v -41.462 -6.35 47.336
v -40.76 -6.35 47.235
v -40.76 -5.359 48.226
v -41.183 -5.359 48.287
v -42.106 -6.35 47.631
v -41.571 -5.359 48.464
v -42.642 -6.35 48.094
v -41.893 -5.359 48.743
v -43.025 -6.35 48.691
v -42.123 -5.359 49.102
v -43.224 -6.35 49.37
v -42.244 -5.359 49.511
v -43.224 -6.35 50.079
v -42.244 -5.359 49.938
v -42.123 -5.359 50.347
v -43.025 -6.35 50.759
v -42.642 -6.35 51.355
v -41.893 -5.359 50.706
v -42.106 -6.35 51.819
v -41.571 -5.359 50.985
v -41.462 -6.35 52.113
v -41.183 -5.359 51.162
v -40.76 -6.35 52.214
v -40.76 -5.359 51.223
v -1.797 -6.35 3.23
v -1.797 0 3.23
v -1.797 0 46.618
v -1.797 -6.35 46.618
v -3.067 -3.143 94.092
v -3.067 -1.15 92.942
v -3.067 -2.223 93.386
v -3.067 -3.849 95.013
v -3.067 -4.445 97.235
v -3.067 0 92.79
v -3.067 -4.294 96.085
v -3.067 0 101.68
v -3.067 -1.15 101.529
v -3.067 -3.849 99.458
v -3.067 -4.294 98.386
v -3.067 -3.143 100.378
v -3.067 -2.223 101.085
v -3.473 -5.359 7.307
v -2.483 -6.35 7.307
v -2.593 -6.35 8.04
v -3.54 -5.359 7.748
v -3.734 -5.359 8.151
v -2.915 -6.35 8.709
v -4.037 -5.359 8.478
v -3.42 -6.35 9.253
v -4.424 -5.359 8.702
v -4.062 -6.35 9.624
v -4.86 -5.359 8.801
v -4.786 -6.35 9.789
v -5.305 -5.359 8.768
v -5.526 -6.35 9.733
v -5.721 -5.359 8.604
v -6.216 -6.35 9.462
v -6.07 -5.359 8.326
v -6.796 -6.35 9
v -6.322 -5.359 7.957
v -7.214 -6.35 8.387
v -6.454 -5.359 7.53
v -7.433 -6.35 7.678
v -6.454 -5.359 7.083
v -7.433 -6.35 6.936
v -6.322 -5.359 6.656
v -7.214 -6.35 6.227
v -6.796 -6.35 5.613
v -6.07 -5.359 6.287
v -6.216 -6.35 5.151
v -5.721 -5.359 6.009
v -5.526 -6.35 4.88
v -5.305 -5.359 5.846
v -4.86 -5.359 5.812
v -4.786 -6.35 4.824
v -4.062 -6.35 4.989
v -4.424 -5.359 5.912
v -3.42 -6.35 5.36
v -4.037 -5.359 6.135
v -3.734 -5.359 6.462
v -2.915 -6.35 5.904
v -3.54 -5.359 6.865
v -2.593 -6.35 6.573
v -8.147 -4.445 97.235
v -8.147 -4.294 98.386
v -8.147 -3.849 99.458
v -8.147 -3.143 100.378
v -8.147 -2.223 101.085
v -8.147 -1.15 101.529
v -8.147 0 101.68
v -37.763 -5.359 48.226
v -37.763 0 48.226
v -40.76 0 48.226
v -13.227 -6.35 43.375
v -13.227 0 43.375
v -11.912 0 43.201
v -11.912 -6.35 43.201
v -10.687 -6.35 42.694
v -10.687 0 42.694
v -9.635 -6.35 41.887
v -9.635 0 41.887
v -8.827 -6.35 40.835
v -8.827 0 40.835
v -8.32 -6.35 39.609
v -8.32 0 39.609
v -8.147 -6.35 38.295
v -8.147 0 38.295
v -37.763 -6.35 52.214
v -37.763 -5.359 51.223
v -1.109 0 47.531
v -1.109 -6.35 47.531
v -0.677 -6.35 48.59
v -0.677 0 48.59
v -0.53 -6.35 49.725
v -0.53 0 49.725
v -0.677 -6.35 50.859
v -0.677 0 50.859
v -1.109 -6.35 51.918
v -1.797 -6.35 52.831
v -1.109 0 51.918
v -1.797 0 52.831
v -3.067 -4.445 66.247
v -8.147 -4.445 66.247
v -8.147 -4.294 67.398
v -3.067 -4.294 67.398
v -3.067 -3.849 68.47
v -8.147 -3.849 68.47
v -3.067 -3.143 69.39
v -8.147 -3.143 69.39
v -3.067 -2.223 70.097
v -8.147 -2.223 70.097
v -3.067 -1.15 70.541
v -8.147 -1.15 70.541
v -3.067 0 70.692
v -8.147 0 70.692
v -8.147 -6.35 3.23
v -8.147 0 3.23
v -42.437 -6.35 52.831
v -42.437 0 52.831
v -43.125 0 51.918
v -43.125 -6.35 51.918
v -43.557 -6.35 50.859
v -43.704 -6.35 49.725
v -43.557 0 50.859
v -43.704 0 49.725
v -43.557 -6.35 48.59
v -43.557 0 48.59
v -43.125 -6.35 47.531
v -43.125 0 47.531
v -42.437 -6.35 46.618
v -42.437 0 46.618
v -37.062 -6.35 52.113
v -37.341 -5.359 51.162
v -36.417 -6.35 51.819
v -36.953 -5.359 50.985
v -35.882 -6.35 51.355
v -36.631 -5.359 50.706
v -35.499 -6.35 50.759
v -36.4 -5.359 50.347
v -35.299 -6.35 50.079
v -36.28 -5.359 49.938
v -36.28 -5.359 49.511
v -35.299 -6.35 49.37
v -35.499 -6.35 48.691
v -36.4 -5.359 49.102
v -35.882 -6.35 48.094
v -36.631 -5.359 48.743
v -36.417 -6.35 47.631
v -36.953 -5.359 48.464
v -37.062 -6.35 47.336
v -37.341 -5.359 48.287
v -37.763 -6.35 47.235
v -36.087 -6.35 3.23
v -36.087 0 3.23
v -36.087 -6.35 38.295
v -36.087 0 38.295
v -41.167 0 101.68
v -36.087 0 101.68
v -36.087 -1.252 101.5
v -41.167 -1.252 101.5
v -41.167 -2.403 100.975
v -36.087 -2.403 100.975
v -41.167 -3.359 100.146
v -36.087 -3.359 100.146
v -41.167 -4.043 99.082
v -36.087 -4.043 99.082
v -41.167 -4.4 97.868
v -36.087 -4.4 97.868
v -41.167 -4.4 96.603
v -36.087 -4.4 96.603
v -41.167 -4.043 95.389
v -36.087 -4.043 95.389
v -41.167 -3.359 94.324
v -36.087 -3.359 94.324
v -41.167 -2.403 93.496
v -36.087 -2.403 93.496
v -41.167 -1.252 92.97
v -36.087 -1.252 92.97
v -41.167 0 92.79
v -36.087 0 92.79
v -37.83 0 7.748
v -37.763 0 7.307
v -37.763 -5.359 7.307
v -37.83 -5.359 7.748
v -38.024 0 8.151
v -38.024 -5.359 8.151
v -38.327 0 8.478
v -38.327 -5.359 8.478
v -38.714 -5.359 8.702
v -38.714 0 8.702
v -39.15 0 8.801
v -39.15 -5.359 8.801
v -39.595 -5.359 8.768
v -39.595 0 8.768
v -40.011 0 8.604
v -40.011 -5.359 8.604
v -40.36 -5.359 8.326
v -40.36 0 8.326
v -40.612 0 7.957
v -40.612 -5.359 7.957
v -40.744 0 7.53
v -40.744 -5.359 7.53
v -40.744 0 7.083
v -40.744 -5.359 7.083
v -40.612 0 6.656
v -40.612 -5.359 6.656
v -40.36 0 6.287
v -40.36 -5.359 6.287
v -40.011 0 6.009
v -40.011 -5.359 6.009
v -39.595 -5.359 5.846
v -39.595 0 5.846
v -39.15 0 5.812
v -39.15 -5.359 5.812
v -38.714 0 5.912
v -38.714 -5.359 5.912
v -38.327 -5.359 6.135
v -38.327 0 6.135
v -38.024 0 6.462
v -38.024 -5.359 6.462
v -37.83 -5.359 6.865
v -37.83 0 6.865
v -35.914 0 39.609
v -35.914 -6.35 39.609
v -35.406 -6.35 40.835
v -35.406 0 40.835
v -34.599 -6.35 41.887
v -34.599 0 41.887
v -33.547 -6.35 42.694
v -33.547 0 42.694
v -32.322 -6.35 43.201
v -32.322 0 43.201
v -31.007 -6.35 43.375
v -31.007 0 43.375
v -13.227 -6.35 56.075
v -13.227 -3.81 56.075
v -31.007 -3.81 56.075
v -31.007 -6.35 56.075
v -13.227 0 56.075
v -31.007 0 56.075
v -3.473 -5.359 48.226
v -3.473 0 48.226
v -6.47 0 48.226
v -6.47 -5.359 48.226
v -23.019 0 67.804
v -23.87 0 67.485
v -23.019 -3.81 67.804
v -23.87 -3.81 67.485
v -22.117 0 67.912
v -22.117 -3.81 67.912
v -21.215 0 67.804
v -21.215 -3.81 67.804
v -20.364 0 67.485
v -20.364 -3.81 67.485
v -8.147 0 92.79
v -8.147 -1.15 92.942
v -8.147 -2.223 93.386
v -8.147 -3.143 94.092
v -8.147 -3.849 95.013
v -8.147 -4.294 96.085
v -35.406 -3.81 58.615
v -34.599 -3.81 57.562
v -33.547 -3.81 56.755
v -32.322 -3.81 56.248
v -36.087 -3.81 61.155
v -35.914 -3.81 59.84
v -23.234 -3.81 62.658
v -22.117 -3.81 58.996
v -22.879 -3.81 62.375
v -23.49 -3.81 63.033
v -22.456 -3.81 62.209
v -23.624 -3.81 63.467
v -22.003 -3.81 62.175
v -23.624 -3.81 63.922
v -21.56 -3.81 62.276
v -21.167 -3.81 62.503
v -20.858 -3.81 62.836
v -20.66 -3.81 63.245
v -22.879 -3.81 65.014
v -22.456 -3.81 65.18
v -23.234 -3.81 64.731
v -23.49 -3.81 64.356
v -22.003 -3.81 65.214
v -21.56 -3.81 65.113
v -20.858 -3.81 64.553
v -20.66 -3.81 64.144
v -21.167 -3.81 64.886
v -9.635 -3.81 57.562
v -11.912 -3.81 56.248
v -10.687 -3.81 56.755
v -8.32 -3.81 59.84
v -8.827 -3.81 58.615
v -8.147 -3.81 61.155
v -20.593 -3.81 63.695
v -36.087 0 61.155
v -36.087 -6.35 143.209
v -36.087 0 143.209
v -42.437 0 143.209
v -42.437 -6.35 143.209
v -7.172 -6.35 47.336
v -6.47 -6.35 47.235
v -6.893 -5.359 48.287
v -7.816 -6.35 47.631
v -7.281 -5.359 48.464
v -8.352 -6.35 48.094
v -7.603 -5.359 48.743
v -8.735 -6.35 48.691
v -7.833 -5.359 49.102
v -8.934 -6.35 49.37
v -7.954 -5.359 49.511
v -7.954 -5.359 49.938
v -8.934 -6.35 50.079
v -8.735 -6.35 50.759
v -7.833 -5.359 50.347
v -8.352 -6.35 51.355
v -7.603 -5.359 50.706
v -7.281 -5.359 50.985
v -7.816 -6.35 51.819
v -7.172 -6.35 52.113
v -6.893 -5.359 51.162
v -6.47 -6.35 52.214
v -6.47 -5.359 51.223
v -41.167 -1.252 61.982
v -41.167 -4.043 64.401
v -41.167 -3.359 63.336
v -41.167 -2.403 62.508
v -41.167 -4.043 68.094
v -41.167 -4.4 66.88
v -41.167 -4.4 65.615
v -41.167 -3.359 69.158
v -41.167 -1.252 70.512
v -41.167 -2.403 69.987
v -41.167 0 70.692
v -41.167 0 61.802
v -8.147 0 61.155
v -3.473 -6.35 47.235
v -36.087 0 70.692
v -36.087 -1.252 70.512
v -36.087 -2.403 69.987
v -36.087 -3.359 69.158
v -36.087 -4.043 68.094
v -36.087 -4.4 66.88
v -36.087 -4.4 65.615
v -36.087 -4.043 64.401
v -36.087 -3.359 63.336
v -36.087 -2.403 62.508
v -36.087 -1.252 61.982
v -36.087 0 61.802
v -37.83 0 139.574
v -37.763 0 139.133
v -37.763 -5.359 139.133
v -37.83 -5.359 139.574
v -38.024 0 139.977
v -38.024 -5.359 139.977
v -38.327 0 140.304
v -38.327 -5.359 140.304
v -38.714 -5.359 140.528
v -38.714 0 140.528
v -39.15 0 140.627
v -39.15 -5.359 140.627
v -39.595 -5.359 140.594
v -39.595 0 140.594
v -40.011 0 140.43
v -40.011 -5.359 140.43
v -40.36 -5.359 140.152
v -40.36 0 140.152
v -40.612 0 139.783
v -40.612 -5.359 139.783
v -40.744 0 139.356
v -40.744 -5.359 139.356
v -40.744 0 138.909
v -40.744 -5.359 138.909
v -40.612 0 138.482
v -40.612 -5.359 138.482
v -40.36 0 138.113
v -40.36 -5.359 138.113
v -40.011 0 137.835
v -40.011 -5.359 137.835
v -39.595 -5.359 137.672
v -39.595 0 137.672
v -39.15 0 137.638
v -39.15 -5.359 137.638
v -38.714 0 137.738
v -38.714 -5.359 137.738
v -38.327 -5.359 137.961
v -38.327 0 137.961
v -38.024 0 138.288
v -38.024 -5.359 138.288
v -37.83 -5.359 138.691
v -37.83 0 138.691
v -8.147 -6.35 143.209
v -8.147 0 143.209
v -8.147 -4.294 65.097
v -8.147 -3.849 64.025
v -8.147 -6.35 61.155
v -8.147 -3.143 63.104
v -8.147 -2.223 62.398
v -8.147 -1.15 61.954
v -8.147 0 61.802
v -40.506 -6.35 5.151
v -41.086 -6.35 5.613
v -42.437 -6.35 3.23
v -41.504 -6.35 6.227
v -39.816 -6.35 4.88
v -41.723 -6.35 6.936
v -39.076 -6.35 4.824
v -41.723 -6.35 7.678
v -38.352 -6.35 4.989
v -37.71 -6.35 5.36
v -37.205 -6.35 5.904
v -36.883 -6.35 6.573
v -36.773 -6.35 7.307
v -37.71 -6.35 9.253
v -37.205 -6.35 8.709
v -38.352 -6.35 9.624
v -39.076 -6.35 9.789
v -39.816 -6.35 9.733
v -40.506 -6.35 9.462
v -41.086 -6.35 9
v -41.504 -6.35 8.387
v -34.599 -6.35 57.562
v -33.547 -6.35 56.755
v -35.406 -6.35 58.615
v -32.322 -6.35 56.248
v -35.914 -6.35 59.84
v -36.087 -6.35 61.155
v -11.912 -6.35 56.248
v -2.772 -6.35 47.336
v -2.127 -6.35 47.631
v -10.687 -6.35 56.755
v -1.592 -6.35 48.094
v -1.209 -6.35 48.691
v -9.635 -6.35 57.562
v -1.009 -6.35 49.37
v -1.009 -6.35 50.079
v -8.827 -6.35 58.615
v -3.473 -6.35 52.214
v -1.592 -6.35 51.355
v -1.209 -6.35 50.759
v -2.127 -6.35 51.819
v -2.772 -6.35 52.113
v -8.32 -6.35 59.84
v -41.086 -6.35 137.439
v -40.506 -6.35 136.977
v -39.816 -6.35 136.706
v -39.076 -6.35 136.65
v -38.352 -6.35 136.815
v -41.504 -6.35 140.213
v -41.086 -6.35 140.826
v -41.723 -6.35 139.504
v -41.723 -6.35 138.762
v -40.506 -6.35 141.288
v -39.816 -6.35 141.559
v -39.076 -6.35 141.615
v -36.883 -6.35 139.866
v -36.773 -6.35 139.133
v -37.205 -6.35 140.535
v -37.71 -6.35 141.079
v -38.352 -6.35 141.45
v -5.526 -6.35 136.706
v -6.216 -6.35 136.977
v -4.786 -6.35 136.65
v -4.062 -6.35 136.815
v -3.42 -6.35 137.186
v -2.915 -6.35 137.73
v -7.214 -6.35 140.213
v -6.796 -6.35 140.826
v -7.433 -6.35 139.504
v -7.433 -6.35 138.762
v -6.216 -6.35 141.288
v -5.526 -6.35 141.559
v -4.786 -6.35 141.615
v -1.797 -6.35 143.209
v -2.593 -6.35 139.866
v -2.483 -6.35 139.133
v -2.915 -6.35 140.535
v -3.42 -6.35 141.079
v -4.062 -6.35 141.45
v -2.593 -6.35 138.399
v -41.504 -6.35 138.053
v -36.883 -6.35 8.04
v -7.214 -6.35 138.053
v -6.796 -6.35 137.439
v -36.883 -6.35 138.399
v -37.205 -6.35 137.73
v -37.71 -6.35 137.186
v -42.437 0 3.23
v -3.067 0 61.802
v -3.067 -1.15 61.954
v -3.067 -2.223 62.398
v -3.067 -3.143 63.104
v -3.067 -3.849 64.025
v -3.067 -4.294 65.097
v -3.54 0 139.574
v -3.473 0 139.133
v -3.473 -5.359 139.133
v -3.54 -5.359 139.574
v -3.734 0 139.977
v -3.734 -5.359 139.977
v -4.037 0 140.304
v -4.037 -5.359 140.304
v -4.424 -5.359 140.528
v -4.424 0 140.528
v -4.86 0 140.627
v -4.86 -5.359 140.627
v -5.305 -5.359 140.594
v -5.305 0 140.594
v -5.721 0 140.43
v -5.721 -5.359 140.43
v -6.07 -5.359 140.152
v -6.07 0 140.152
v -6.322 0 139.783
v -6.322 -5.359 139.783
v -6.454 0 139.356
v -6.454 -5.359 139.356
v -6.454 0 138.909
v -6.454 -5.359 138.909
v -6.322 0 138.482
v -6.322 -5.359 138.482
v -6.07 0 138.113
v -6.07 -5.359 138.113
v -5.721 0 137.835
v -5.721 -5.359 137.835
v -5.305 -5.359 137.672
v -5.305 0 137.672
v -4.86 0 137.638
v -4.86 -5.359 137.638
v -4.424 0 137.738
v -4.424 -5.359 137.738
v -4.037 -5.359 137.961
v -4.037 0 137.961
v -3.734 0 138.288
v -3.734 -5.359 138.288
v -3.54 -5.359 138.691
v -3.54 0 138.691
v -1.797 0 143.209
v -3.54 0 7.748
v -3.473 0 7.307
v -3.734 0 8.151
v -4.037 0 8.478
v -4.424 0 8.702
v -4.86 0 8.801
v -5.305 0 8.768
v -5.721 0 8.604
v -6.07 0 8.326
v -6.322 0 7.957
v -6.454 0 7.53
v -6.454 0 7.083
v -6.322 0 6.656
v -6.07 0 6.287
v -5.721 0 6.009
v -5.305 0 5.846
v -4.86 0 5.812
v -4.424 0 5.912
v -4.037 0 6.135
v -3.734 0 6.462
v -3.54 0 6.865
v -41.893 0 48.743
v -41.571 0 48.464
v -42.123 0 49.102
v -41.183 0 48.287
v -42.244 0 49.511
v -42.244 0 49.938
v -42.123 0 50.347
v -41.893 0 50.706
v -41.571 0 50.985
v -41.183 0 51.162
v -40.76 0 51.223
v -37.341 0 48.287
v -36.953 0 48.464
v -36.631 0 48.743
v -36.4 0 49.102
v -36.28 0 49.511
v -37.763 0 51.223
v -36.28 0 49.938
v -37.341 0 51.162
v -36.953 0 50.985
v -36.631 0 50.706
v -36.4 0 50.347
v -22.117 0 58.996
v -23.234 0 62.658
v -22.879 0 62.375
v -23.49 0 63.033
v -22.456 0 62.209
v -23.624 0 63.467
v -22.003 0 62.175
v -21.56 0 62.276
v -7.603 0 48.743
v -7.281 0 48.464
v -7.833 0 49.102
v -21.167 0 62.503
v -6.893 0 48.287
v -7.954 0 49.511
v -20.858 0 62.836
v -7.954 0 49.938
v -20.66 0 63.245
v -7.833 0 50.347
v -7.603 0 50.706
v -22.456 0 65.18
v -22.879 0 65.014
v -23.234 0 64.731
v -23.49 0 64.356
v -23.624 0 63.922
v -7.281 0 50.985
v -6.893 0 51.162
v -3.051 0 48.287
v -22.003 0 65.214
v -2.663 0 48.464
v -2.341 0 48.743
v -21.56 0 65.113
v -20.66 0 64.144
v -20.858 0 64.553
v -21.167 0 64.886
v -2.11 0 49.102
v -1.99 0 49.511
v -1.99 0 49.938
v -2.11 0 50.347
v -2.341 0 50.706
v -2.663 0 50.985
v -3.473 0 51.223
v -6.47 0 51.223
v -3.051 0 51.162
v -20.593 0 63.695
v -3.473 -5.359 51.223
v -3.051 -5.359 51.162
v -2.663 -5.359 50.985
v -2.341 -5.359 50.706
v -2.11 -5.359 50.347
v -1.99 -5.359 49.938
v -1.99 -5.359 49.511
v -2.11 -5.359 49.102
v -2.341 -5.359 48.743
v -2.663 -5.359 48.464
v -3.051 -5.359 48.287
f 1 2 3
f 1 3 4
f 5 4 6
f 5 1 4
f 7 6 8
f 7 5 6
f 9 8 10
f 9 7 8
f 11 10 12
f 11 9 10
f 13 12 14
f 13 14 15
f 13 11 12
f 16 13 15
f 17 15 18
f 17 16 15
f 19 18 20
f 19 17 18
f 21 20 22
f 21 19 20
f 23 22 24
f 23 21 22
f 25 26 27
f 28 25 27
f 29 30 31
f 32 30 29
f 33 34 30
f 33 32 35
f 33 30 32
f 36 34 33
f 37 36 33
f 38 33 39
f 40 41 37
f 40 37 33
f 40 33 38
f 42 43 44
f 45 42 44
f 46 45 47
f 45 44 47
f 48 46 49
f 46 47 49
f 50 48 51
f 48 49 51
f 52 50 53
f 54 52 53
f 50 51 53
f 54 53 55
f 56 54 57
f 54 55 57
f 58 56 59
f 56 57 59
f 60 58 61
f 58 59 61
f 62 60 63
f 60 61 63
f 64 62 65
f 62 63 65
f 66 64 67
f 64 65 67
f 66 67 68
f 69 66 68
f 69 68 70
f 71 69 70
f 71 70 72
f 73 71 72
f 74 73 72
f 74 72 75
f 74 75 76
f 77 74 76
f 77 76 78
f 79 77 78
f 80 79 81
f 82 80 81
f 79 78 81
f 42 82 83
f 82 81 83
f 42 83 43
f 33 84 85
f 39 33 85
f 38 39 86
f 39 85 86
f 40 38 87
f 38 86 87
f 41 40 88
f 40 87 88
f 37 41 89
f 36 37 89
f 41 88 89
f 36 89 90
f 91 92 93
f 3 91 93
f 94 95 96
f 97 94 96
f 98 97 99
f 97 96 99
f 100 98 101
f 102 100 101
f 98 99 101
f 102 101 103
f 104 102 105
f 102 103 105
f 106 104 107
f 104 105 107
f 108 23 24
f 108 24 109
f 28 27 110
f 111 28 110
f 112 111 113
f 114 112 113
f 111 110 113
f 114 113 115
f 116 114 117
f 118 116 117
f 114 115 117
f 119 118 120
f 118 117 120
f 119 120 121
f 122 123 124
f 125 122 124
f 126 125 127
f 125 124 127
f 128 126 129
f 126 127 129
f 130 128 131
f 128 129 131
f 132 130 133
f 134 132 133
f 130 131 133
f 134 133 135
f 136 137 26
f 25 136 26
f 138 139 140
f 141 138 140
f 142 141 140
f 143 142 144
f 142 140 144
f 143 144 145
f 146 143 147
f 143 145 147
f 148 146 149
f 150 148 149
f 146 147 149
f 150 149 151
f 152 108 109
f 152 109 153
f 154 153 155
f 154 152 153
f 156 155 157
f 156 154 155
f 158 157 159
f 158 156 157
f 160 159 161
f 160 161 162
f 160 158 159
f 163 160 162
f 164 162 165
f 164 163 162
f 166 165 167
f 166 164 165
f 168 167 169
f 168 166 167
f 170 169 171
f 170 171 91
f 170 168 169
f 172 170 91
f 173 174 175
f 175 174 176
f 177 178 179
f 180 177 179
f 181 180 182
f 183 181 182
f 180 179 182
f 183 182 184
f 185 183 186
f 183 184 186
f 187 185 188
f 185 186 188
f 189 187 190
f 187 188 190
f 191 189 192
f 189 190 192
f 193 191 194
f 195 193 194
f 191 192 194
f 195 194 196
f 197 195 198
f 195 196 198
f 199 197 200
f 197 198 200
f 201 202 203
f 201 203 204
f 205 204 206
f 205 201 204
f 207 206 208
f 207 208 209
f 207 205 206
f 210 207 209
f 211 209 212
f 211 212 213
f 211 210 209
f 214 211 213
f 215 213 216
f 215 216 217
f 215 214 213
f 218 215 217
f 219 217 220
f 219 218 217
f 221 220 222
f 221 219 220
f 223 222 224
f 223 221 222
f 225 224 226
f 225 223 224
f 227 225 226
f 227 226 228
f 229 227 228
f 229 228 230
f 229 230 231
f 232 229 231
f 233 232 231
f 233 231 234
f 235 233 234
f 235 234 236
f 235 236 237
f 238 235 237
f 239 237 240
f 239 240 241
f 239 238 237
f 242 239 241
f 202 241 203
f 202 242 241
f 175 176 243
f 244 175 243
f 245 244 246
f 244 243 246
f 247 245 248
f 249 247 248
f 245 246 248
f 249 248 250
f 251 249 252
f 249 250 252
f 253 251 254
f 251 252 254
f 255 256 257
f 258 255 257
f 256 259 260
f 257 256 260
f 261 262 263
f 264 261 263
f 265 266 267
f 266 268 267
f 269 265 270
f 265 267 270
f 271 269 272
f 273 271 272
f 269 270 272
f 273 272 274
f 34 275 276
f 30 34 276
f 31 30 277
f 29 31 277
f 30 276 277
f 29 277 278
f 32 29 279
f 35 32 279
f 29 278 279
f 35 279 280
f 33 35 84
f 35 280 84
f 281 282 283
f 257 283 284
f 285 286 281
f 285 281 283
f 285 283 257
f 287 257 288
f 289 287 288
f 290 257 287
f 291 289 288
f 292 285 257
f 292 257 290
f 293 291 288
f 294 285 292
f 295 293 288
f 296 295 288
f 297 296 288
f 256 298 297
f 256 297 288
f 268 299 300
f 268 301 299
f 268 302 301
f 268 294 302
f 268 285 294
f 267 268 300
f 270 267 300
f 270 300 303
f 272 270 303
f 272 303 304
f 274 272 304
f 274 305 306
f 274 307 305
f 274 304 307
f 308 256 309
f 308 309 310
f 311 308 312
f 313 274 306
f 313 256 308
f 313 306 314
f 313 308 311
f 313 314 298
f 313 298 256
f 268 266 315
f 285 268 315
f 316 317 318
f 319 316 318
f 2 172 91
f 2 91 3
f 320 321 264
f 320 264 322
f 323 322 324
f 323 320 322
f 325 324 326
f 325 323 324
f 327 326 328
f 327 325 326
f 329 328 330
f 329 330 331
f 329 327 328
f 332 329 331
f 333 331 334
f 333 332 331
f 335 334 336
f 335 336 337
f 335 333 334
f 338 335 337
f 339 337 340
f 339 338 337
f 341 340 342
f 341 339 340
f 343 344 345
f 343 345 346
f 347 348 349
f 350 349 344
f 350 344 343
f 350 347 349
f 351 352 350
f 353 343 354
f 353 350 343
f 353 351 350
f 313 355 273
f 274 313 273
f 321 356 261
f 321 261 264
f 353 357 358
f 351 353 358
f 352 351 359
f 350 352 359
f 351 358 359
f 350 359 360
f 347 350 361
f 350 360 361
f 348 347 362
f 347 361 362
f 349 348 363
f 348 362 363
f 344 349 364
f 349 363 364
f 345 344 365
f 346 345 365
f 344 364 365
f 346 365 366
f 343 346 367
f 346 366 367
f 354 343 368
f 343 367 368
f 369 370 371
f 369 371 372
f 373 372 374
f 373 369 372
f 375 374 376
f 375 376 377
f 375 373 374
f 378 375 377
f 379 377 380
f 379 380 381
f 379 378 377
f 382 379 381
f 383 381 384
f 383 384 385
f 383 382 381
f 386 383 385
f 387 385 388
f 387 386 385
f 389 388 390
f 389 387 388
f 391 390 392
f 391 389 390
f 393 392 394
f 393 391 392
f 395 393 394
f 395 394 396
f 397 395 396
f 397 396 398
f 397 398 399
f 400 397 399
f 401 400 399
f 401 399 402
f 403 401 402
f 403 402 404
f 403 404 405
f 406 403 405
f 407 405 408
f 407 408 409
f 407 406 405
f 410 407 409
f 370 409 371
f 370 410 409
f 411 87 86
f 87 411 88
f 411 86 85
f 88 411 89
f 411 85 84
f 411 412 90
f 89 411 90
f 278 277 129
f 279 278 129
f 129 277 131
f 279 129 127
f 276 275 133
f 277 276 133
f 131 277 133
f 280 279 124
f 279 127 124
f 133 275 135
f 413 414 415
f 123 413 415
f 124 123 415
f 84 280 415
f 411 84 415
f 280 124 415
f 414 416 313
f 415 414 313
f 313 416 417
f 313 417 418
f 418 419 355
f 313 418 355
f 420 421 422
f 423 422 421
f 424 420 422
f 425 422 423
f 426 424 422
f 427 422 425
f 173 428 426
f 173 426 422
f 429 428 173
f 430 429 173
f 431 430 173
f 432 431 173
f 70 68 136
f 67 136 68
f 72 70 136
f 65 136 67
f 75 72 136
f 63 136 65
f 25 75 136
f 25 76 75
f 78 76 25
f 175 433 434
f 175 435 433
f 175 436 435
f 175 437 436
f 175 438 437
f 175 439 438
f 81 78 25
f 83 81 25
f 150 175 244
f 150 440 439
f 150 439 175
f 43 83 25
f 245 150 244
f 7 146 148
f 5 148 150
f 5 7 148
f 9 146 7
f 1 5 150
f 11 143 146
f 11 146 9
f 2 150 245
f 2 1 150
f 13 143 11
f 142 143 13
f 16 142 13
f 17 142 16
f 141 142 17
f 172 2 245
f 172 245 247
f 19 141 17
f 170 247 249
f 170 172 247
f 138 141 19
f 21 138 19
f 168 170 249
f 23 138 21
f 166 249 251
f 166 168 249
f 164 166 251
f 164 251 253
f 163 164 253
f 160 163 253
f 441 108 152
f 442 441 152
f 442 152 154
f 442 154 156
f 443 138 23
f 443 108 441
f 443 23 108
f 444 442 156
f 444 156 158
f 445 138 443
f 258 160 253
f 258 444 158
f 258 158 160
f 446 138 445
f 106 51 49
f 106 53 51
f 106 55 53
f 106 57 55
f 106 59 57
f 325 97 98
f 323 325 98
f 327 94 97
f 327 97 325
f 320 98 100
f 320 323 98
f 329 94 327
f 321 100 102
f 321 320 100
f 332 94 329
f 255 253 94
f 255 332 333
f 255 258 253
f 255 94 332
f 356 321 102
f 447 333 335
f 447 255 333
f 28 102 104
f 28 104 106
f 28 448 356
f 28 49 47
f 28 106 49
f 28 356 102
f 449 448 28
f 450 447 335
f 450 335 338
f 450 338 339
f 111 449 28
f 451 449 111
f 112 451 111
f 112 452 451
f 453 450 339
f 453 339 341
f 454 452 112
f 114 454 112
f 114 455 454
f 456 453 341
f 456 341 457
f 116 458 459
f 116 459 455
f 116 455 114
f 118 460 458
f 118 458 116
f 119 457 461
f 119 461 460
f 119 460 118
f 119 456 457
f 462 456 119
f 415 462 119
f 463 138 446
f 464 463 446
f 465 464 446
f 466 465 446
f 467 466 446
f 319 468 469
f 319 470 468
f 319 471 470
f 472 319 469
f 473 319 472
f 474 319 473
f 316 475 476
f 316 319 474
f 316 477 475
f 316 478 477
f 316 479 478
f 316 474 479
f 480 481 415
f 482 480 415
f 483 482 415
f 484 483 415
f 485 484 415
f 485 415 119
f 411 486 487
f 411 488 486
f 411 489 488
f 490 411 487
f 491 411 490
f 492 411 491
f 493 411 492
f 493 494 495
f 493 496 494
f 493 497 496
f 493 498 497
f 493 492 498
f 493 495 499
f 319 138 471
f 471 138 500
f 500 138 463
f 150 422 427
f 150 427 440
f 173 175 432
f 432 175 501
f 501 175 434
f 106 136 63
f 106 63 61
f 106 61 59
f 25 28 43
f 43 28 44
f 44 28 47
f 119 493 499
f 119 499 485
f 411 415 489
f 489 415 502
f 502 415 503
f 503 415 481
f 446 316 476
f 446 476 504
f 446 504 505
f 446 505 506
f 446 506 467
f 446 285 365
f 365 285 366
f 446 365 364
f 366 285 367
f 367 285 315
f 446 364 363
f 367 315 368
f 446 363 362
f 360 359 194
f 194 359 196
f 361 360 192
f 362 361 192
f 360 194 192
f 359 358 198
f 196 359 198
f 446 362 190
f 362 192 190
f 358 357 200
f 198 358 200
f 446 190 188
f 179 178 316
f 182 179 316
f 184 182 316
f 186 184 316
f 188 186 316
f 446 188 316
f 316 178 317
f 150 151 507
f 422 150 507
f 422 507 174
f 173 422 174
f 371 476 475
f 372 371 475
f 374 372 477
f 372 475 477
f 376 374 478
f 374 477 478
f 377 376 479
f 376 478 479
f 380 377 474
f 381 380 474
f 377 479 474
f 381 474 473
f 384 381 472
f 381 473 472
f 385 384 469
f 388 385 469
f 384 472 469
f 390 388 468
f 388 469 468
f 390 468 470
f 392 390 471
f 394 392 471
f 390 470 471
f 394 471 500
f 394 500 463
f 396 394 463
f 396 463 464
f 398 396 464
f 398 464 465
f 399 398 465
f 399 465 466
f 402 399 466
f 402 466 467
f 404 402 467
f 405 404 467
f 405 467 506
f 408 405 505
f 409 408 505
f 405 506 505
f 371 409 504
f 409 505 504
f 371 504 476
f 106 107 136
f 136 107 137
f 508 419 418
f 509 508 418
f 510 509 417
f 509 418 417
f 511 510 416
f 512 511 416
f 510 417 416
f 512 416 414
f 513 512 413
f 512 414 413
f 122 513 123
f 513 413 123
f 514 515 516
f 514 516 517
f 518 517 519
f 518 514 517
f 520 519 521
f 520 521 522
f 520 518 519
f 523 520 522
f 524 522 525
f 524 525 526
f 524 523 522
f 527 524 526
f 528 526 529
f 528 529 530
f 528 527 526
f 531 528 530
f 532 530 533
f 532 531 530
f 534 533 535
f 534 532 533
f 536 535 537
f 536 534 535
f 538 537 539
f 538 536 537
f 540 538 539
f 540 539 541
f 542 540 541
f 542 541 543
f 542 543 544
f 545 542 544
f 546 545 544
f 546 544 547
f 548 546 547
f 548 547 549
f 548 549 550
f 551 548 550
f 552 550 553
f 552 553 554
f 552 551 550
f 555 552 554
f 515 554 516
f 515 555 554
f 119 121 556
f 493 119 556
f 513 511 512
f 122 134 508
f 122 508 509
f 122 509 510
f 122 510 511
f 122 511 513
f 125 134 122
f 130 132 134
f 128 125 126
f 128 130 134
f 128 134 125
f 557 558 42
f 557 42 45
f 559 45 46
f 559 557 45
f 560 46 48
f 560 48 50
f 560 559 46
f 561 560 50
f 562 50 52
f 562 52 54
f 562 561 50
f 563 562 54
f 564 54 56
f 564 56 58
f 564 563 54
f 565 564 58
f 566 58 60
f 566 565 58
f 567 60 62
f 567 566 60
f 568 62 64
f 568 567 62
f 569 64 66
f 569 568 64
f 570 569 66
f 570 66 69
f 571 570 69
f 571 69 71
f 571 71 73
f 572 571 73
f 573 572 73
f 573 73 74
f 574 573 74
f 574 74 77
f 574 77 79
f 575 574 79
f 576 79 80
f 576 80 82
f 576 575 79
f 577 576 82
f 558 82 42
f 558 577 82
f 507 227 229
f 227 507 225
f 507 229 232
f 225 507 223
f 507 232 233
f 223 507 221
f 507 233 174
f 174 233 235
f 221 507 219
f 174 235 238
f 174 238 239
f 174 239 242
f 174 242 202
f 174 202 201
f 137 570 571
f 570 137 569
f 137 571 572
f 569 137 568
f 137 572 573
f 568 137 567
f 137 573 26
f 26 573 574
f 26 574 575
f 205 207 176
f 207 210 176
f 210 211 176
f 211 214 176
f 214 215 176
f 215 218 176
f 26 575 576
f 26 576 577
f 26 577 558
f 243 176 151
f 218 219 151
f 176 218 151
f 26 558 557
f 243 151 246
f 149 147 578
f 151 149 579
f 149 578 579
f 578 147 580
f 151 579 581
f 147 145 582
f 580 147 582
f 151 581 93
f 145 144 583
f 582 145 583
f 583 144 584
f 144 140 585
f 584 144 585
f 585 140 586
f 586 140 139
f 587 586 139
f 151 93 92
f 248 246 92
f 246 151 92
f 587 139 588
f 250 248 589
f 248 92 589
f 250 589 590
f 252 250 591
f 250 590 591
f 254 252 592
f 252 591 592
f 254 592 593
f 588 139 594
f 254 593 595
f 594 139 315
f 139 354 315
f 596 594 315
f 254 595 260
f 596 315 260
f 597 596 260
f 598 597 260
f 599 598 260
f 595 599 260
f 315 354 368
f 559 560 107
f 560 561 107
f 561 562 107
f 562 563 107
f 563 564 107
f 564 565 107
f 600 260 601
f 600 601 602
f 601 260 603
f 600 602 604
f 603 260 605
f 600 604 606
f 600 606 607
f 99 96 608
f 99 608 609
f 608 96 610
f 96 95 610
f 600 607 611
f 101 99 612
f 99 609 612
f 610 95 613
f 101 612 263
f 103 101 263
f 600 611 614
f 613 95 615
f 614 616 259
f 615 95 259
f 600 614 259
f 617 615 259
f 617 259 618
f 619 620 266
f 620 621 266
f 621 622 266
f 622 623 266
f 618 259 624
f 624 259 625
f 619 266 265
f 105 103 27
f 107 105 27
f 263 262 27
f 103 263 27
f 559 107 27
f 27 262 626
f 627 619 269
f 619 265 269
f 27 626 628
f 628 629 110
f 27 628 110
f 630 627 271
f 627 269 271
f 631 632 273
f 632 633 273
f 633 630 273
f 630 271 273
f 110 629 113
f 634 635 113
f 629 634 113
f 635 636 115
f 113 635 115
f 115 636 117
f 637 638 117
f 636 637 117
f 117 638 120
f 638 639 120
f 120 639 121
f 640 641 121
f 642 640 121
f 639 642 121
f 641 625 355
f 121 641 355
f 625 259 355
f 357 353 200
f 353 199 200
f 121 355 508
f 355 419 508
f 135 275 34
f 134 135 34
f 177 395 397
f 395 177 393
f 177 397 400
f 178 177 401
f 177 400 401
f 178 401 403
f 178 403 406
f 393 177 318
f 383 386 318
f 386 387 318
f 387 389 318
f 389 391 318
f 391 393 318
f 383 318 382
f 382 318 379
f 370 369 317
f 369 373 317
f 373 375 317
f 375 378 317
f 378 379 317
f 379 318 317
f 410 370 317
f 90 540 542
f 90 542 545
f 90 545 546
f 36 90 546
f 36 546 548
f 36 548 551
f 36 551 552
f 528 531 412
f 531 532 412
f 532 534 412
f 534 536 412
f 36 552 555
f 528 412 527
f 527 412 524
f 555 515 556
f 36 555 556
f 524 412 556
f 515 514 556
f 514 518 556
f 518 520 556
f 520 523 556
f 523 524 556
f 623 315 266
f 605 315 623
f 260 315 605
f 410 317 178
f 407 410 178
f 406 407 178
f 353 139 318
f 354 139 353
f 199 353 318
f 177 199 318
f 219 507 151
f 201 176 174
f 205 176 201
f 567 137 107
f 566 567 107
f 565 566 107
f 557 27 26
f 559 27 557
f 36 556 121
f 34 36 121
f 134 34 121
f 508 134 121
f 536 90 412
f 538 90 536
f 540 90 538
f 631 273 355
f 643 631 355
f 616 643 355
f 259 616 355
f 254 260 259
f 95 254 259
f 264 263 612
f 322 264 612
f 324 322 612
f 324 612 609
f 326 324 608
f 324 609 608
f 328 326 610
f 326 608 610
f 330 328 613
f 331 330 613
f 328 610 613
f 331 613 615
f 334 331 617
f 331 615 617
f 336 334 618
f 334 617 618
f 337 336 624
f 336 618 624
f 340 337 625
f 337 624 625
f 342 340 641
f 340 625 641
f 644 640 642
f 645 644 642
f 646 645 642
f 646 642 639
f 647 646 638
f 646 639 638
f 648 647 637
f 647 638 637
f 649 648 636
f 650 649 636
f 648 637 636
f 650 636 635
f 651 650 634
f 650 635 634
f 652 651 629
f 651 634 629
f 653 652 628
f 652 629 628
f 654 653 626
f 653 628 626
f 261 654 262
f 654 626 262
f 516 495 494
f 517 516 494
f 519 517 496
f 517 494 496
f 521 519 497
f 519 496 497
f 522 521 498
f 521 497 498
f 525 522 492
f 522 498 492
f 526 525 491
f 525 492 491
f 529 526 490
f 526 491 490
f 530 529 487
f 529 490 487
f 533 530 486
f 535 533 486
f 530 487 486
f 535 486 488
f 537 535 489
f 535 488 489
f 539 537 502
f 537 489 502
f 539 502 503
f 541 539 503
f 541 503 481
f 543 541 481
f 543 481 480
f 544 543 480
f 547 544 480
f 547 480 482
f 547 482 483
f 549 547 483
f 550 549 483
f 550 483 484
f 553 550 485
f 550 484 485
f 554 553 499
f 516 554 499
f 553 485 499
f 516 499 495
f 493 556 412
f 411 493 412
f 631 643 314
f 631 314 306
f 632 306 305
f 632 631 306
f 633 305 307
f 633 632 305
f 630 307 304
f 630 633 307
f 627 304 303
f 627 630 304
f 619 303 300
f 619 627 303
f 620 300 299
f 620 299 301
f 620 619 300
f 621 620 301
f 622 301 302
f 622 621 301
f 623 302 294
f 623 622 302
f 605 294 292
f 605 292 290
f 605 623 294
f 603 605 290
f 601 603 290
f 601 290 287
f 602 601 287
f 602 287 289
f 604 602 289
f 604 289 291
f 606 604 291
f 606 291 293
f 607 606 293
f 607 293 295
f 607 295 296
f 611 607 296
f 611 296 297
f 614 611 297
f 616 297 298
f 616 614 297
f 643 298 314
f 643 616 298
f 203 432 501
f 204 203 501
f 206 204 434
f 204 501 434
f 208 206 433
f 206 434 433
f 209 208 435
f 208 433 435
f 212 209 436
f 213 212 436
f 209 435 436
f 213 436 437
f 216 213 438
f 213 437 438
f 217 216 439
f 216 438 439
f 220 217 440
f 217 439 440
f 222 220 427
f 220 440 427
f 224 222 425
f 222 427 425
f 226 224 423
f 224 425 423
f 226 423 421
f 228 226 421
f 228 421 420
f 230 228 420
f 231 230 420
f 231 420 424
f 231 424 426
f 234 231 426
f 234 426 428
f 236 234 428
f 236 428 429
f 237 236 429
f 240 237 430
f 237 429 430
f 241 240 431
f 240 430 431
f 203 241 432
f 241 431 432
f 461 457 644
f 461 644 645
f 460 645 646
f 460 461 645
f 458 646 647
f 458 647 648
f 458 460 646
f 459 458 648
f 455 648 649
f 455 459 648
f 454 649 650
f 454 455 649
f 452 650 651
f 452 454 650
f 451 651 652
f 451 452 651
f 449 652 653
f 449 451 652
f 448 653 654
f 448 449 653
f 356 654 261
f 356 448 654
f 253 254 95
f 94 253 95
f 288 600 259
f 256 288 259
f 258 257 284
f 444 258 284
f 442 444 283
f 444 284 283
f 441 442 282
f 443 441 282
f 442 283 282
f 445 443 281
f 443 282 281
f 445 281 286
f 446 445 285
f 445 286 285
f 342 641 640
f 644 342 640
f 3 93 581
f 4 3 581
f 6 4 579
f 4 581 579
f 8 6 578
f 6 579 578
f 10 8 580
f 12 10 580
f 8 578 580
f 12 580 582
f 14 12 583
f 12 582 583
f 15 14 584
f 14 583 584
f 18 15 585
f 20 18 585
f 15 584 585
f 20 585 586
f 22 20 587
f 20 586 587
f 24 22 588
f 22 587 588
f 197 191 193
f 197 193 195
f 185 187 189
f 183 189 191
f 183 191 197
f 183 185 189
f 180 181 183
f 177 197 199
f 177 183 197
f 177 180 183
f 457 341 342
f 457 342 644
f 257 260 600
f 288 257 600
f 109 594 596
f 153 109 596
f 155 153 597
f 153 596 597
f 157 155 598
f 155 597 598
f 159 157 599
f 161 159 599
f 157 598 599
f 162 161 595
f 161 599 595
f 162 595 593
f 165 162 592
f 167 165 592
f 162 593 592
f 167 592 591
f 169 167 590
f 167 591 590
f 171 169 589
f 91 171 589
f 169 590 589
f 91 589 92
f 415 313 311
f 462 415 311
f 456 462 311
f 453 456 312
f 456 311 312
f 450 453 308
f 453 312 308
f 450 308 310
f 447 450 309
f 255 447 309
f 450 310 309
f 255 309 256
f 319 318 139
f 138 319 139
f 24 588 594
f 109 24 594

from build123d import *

# Parameters (mm, degrees)
F0_R     = 1.4986
F1_DEPTH = 6.35
F2_SIZE  = 0.9906
F0_R_2   = 1.524
F3_DEPTH = 3.81
F5_DEPTH = 5.08
F7_DEPTH = 5.08
F8_R     = 3.81


with BuildPart() as f1:
    # F0 (on Front) → F1 (new body)
    with BuildSketch(Plane.XZ):
        with BuildLine():
            Line((-36.0867052997, 143.2092670372), (-42.4367052997, 143.2092670372))
            Line((-42.4367052997, 143.2092670372), (-42.4367052997, 52.8312826116))
            ThreePointArc((-42.4367052997, 52.8312826116), (-43.703811406, 49.7245670372), (-42.4367052997, 46.6178514628))
            Line((-42.4367052997, 46.6178514628), (-42.4367052997, 3.2298670372))
            Line((-42.4367052997, 3.2298670372), (-36.0867052997, 3.2298670372))
            Line((-36.0867052997, 3.2298670372), (-36.0867052997, 38.2945670372))
            ThreePointArc((-36.0867052997, 38.2945670372), (-34.5988077481, 41.8866694856), (-31.0067052997, 43.3745670372))
            Line((-31.0067052997, 43.3745670372), (-13.2267052997, 43.3745670372))
            ThreePointArc((-13.2267052997, 43.3745670372), (-9.6346028513, 41.8866694856), (-8.1467052997, 38.2945670372))
            Line((-8.1467052997, 38.2945670372), (-8.1467052997, 3.2298670372))
            Line((-8.1467052997, 3.2298670372), (-1.7967052997, 3.2298670372))
            Line((-1.7967052997, 3.2298670372), (-1.7967052997, 46.6178514628))
            ThreePointArc((-1.7967052997, 46.6178514628), (-0.5295991933, 49.7245670372), (-1.7967052997, 52.8312826116))
            Line((-1.7967052997, 52.8312826116), (-1.7967052997, 143.2092670372))
            Line((-1.7967052997, 143.2092670372), (-8.1467052997, 143.2092670372))
            Line((-8.1467052997, 143.2092670372), (-8.1467052997, 61.1545671391))
            ThreePointArc((-8.1467052997, 61.1545671391), (-9.6346028513, 57.5624646907), (-13.2267052997, 56.0745671391))
            Line((-13.2267052997, 56.0745671391), (-31.0067052997, 56.0745671391))
            ThreePointArc((-31.0067052997, 56.0745671391), (-34.5988077481, 57.5624646907), (-36.0867052997, 61.1545671391))
            Line((-36.0867052997, 61.1545671391), (-36.0867052997, 143.2092670372))
        make_face()
        with Locations((-39.2617052997, 7.3065670372)):
            Circle(F0_R, mode=Mode.SUBTRACT)
        with BuildLine():
            ThreePointArc((-40.7603052997, 48.2259670372), (-42.2589052997, 49.7245670372), (-40.7603052997, 51.2231670372))
            Line((-40.7603052997, 51.2231670372), (-37.7631052997, 51.2231670372))
            ThreePointArc((-37.7631052997, 51.2231670372), (-36.2645052997, 49.7245670372), (-37.7631052997, 48.2259670372))
            Line((-37.7631052997, 48.2259670372), (-40.7603052997, 48.2259670372))
        make_face(mode=Mode.SUBTRACT)
        with Locations((-4.9717052997, 7.3065670372)):
            Circle(F0_R, mode=Mode.SUBTRACT)
        with BuildLine():
            ThreePointArc((-6.4703052997, 48.2259670372), (-7.9689052997, 49.7245670372), (-6.4703052997, 51.2231670372))
            Line((-6.4703052997, 51.2231670372), (-3.4731052997, 51.2231670372))
            ThreePointArc((-3.4731052997, 51.2231670372), (-1.9745052997, 49.7245670372), (-3.4731052997, 48.2259670372))
            Line((-3.4731052997, 48.2259670372), (-6.4703052997, 48.2259670372))
        make_face(mode=Mode.SUBTRACT)
        with Locations((-39.2617052997, 139.1325670372)):
            Circle(F0_R, mode=Mode.SUBTRACT)
        with Locations((-4.9717052997, 139.1325670372)):
            Circle(F0_R, mode=Mode.SUBTRACT)
    extrude(amount=F1_DEPTH)

    # F2
    f2_edges = [f1.edges().sort_by_distance(p)[0] for p in [
        (-40.760305, -6.35, 7.306567),
        (-36.264505, -6.35, 49.724567),
        (-40.760305, -6.35, 139.132567),
        (-4.971705, -6.35, 48.225967),
        (-6.470305, -6.35, 7.306567),
        (-6.470305, -6.35, 139.132567),
    ]]
    chamfer(f2_edges, length=F2_SIZE)

    # F0 (on Front) → F3 (join)
    with BuildSketch(Plane.XZ):
        with BuildLine():
            Line((-22.1167052997, 68.3935671391), (-36.0867052997, 61.1545671391))
            ThreePointArc((-36.0867052997, 61.1545671391), (-34.5988077481, 57.5624646907), (-31.0067052997, 56.0745671391))
            Line((-31.0067052997, 56.0745671391), (-22.1167052997, 58.9955671391))
            Line((-22.1167052997, 58.9955671391), (-13.2267052997, 56.0745671391))
            ThreePointArc((-13.2267052997, 56.0745671391), (-9.6346028513, 57.5624646907), (-8.1467052997, 61.1545671391))
            Line((-8.1467052997, 61.1545671391), (-22.1167052997, 68.3935671391))
        make_face()
        with Locations((-22.1167052997, 63.6945671391)):
            Circle(F0_R_2, mode=Mode.SUBTRACT)
    extrude(amount=F3_DEPTH)

    # F4 (on face) → F5 (cut)
    with BuildSketch(Plane(origin=(-8.1467052997, 0, 0), x_dir=(0, -1, 0), z_dir=(-1, 0, 0))):
        with BuildLine():
            ThreePointArc((4.445, 97.2352670372), (3.1430896424, 100.3783566796), (0, 101.6802670372))
            Line((0, 101.6802670372), (0, 97.2352670372))
            Line((0, 97.2352670372), (0, 92.7902670372))
            ThreePointArc((0, 92.7902670372), (3.1430896424, 94.0921773948), (4.445, 97.2352670372))
        make_face()
        with BuildLine():
            ThreePointArc((4.445, 66.2472670372), (3.1430896424, 69.3903566796), (0, 70.6922670372))
            Line((0, 70.6922670372), (0, 66.2472670372))
            Line((0, 66.2472670372), (0, 61.8022670372))
            ThreePointArc((0, 61.8022670372), (3.1430896424, 63.1041773948), (4.445, 66.2472670372))
        make_face()
    extrude(amount=-F5_DEPTH, mode=Mode.SUBTRACT)

    # F6 (on face) → F7 (cut)
    with BuildSketch(Plane.YZ.offset(-36.0867052997)):
        with BuildLine():
            Line((0, 97.2352670372), (0, 101.6802670372))
            ThreePointArc((0, 101.6802670372), (-4.445, 97.2352670372), (0, 92.7902670372))
            Line((0, 92.7902670372), (0, 97.2352670372))
        make_face()
        with BuildLine():
            Line((0, 66.2472670372), (0, 70.6922670372))
            ThreePointArc((0, 70.6922670372), (-4.445, 66.2472670372), (0, 61.8022670372))
            Line((0, 61.8022670372), (0, 66.2472670372))
        make_face()
    extrude(amount=-F7_DEPTH, mode=Mode.SUBTRACT)

    # F8
    f8_edges = [f1.edges().sort_by_distance(p)[0] for p in [
        (-22.116705, -1.905, 68.393567),
    ]]
    fillet(f8_edges, radius=F8_R)


solid = f1.part
